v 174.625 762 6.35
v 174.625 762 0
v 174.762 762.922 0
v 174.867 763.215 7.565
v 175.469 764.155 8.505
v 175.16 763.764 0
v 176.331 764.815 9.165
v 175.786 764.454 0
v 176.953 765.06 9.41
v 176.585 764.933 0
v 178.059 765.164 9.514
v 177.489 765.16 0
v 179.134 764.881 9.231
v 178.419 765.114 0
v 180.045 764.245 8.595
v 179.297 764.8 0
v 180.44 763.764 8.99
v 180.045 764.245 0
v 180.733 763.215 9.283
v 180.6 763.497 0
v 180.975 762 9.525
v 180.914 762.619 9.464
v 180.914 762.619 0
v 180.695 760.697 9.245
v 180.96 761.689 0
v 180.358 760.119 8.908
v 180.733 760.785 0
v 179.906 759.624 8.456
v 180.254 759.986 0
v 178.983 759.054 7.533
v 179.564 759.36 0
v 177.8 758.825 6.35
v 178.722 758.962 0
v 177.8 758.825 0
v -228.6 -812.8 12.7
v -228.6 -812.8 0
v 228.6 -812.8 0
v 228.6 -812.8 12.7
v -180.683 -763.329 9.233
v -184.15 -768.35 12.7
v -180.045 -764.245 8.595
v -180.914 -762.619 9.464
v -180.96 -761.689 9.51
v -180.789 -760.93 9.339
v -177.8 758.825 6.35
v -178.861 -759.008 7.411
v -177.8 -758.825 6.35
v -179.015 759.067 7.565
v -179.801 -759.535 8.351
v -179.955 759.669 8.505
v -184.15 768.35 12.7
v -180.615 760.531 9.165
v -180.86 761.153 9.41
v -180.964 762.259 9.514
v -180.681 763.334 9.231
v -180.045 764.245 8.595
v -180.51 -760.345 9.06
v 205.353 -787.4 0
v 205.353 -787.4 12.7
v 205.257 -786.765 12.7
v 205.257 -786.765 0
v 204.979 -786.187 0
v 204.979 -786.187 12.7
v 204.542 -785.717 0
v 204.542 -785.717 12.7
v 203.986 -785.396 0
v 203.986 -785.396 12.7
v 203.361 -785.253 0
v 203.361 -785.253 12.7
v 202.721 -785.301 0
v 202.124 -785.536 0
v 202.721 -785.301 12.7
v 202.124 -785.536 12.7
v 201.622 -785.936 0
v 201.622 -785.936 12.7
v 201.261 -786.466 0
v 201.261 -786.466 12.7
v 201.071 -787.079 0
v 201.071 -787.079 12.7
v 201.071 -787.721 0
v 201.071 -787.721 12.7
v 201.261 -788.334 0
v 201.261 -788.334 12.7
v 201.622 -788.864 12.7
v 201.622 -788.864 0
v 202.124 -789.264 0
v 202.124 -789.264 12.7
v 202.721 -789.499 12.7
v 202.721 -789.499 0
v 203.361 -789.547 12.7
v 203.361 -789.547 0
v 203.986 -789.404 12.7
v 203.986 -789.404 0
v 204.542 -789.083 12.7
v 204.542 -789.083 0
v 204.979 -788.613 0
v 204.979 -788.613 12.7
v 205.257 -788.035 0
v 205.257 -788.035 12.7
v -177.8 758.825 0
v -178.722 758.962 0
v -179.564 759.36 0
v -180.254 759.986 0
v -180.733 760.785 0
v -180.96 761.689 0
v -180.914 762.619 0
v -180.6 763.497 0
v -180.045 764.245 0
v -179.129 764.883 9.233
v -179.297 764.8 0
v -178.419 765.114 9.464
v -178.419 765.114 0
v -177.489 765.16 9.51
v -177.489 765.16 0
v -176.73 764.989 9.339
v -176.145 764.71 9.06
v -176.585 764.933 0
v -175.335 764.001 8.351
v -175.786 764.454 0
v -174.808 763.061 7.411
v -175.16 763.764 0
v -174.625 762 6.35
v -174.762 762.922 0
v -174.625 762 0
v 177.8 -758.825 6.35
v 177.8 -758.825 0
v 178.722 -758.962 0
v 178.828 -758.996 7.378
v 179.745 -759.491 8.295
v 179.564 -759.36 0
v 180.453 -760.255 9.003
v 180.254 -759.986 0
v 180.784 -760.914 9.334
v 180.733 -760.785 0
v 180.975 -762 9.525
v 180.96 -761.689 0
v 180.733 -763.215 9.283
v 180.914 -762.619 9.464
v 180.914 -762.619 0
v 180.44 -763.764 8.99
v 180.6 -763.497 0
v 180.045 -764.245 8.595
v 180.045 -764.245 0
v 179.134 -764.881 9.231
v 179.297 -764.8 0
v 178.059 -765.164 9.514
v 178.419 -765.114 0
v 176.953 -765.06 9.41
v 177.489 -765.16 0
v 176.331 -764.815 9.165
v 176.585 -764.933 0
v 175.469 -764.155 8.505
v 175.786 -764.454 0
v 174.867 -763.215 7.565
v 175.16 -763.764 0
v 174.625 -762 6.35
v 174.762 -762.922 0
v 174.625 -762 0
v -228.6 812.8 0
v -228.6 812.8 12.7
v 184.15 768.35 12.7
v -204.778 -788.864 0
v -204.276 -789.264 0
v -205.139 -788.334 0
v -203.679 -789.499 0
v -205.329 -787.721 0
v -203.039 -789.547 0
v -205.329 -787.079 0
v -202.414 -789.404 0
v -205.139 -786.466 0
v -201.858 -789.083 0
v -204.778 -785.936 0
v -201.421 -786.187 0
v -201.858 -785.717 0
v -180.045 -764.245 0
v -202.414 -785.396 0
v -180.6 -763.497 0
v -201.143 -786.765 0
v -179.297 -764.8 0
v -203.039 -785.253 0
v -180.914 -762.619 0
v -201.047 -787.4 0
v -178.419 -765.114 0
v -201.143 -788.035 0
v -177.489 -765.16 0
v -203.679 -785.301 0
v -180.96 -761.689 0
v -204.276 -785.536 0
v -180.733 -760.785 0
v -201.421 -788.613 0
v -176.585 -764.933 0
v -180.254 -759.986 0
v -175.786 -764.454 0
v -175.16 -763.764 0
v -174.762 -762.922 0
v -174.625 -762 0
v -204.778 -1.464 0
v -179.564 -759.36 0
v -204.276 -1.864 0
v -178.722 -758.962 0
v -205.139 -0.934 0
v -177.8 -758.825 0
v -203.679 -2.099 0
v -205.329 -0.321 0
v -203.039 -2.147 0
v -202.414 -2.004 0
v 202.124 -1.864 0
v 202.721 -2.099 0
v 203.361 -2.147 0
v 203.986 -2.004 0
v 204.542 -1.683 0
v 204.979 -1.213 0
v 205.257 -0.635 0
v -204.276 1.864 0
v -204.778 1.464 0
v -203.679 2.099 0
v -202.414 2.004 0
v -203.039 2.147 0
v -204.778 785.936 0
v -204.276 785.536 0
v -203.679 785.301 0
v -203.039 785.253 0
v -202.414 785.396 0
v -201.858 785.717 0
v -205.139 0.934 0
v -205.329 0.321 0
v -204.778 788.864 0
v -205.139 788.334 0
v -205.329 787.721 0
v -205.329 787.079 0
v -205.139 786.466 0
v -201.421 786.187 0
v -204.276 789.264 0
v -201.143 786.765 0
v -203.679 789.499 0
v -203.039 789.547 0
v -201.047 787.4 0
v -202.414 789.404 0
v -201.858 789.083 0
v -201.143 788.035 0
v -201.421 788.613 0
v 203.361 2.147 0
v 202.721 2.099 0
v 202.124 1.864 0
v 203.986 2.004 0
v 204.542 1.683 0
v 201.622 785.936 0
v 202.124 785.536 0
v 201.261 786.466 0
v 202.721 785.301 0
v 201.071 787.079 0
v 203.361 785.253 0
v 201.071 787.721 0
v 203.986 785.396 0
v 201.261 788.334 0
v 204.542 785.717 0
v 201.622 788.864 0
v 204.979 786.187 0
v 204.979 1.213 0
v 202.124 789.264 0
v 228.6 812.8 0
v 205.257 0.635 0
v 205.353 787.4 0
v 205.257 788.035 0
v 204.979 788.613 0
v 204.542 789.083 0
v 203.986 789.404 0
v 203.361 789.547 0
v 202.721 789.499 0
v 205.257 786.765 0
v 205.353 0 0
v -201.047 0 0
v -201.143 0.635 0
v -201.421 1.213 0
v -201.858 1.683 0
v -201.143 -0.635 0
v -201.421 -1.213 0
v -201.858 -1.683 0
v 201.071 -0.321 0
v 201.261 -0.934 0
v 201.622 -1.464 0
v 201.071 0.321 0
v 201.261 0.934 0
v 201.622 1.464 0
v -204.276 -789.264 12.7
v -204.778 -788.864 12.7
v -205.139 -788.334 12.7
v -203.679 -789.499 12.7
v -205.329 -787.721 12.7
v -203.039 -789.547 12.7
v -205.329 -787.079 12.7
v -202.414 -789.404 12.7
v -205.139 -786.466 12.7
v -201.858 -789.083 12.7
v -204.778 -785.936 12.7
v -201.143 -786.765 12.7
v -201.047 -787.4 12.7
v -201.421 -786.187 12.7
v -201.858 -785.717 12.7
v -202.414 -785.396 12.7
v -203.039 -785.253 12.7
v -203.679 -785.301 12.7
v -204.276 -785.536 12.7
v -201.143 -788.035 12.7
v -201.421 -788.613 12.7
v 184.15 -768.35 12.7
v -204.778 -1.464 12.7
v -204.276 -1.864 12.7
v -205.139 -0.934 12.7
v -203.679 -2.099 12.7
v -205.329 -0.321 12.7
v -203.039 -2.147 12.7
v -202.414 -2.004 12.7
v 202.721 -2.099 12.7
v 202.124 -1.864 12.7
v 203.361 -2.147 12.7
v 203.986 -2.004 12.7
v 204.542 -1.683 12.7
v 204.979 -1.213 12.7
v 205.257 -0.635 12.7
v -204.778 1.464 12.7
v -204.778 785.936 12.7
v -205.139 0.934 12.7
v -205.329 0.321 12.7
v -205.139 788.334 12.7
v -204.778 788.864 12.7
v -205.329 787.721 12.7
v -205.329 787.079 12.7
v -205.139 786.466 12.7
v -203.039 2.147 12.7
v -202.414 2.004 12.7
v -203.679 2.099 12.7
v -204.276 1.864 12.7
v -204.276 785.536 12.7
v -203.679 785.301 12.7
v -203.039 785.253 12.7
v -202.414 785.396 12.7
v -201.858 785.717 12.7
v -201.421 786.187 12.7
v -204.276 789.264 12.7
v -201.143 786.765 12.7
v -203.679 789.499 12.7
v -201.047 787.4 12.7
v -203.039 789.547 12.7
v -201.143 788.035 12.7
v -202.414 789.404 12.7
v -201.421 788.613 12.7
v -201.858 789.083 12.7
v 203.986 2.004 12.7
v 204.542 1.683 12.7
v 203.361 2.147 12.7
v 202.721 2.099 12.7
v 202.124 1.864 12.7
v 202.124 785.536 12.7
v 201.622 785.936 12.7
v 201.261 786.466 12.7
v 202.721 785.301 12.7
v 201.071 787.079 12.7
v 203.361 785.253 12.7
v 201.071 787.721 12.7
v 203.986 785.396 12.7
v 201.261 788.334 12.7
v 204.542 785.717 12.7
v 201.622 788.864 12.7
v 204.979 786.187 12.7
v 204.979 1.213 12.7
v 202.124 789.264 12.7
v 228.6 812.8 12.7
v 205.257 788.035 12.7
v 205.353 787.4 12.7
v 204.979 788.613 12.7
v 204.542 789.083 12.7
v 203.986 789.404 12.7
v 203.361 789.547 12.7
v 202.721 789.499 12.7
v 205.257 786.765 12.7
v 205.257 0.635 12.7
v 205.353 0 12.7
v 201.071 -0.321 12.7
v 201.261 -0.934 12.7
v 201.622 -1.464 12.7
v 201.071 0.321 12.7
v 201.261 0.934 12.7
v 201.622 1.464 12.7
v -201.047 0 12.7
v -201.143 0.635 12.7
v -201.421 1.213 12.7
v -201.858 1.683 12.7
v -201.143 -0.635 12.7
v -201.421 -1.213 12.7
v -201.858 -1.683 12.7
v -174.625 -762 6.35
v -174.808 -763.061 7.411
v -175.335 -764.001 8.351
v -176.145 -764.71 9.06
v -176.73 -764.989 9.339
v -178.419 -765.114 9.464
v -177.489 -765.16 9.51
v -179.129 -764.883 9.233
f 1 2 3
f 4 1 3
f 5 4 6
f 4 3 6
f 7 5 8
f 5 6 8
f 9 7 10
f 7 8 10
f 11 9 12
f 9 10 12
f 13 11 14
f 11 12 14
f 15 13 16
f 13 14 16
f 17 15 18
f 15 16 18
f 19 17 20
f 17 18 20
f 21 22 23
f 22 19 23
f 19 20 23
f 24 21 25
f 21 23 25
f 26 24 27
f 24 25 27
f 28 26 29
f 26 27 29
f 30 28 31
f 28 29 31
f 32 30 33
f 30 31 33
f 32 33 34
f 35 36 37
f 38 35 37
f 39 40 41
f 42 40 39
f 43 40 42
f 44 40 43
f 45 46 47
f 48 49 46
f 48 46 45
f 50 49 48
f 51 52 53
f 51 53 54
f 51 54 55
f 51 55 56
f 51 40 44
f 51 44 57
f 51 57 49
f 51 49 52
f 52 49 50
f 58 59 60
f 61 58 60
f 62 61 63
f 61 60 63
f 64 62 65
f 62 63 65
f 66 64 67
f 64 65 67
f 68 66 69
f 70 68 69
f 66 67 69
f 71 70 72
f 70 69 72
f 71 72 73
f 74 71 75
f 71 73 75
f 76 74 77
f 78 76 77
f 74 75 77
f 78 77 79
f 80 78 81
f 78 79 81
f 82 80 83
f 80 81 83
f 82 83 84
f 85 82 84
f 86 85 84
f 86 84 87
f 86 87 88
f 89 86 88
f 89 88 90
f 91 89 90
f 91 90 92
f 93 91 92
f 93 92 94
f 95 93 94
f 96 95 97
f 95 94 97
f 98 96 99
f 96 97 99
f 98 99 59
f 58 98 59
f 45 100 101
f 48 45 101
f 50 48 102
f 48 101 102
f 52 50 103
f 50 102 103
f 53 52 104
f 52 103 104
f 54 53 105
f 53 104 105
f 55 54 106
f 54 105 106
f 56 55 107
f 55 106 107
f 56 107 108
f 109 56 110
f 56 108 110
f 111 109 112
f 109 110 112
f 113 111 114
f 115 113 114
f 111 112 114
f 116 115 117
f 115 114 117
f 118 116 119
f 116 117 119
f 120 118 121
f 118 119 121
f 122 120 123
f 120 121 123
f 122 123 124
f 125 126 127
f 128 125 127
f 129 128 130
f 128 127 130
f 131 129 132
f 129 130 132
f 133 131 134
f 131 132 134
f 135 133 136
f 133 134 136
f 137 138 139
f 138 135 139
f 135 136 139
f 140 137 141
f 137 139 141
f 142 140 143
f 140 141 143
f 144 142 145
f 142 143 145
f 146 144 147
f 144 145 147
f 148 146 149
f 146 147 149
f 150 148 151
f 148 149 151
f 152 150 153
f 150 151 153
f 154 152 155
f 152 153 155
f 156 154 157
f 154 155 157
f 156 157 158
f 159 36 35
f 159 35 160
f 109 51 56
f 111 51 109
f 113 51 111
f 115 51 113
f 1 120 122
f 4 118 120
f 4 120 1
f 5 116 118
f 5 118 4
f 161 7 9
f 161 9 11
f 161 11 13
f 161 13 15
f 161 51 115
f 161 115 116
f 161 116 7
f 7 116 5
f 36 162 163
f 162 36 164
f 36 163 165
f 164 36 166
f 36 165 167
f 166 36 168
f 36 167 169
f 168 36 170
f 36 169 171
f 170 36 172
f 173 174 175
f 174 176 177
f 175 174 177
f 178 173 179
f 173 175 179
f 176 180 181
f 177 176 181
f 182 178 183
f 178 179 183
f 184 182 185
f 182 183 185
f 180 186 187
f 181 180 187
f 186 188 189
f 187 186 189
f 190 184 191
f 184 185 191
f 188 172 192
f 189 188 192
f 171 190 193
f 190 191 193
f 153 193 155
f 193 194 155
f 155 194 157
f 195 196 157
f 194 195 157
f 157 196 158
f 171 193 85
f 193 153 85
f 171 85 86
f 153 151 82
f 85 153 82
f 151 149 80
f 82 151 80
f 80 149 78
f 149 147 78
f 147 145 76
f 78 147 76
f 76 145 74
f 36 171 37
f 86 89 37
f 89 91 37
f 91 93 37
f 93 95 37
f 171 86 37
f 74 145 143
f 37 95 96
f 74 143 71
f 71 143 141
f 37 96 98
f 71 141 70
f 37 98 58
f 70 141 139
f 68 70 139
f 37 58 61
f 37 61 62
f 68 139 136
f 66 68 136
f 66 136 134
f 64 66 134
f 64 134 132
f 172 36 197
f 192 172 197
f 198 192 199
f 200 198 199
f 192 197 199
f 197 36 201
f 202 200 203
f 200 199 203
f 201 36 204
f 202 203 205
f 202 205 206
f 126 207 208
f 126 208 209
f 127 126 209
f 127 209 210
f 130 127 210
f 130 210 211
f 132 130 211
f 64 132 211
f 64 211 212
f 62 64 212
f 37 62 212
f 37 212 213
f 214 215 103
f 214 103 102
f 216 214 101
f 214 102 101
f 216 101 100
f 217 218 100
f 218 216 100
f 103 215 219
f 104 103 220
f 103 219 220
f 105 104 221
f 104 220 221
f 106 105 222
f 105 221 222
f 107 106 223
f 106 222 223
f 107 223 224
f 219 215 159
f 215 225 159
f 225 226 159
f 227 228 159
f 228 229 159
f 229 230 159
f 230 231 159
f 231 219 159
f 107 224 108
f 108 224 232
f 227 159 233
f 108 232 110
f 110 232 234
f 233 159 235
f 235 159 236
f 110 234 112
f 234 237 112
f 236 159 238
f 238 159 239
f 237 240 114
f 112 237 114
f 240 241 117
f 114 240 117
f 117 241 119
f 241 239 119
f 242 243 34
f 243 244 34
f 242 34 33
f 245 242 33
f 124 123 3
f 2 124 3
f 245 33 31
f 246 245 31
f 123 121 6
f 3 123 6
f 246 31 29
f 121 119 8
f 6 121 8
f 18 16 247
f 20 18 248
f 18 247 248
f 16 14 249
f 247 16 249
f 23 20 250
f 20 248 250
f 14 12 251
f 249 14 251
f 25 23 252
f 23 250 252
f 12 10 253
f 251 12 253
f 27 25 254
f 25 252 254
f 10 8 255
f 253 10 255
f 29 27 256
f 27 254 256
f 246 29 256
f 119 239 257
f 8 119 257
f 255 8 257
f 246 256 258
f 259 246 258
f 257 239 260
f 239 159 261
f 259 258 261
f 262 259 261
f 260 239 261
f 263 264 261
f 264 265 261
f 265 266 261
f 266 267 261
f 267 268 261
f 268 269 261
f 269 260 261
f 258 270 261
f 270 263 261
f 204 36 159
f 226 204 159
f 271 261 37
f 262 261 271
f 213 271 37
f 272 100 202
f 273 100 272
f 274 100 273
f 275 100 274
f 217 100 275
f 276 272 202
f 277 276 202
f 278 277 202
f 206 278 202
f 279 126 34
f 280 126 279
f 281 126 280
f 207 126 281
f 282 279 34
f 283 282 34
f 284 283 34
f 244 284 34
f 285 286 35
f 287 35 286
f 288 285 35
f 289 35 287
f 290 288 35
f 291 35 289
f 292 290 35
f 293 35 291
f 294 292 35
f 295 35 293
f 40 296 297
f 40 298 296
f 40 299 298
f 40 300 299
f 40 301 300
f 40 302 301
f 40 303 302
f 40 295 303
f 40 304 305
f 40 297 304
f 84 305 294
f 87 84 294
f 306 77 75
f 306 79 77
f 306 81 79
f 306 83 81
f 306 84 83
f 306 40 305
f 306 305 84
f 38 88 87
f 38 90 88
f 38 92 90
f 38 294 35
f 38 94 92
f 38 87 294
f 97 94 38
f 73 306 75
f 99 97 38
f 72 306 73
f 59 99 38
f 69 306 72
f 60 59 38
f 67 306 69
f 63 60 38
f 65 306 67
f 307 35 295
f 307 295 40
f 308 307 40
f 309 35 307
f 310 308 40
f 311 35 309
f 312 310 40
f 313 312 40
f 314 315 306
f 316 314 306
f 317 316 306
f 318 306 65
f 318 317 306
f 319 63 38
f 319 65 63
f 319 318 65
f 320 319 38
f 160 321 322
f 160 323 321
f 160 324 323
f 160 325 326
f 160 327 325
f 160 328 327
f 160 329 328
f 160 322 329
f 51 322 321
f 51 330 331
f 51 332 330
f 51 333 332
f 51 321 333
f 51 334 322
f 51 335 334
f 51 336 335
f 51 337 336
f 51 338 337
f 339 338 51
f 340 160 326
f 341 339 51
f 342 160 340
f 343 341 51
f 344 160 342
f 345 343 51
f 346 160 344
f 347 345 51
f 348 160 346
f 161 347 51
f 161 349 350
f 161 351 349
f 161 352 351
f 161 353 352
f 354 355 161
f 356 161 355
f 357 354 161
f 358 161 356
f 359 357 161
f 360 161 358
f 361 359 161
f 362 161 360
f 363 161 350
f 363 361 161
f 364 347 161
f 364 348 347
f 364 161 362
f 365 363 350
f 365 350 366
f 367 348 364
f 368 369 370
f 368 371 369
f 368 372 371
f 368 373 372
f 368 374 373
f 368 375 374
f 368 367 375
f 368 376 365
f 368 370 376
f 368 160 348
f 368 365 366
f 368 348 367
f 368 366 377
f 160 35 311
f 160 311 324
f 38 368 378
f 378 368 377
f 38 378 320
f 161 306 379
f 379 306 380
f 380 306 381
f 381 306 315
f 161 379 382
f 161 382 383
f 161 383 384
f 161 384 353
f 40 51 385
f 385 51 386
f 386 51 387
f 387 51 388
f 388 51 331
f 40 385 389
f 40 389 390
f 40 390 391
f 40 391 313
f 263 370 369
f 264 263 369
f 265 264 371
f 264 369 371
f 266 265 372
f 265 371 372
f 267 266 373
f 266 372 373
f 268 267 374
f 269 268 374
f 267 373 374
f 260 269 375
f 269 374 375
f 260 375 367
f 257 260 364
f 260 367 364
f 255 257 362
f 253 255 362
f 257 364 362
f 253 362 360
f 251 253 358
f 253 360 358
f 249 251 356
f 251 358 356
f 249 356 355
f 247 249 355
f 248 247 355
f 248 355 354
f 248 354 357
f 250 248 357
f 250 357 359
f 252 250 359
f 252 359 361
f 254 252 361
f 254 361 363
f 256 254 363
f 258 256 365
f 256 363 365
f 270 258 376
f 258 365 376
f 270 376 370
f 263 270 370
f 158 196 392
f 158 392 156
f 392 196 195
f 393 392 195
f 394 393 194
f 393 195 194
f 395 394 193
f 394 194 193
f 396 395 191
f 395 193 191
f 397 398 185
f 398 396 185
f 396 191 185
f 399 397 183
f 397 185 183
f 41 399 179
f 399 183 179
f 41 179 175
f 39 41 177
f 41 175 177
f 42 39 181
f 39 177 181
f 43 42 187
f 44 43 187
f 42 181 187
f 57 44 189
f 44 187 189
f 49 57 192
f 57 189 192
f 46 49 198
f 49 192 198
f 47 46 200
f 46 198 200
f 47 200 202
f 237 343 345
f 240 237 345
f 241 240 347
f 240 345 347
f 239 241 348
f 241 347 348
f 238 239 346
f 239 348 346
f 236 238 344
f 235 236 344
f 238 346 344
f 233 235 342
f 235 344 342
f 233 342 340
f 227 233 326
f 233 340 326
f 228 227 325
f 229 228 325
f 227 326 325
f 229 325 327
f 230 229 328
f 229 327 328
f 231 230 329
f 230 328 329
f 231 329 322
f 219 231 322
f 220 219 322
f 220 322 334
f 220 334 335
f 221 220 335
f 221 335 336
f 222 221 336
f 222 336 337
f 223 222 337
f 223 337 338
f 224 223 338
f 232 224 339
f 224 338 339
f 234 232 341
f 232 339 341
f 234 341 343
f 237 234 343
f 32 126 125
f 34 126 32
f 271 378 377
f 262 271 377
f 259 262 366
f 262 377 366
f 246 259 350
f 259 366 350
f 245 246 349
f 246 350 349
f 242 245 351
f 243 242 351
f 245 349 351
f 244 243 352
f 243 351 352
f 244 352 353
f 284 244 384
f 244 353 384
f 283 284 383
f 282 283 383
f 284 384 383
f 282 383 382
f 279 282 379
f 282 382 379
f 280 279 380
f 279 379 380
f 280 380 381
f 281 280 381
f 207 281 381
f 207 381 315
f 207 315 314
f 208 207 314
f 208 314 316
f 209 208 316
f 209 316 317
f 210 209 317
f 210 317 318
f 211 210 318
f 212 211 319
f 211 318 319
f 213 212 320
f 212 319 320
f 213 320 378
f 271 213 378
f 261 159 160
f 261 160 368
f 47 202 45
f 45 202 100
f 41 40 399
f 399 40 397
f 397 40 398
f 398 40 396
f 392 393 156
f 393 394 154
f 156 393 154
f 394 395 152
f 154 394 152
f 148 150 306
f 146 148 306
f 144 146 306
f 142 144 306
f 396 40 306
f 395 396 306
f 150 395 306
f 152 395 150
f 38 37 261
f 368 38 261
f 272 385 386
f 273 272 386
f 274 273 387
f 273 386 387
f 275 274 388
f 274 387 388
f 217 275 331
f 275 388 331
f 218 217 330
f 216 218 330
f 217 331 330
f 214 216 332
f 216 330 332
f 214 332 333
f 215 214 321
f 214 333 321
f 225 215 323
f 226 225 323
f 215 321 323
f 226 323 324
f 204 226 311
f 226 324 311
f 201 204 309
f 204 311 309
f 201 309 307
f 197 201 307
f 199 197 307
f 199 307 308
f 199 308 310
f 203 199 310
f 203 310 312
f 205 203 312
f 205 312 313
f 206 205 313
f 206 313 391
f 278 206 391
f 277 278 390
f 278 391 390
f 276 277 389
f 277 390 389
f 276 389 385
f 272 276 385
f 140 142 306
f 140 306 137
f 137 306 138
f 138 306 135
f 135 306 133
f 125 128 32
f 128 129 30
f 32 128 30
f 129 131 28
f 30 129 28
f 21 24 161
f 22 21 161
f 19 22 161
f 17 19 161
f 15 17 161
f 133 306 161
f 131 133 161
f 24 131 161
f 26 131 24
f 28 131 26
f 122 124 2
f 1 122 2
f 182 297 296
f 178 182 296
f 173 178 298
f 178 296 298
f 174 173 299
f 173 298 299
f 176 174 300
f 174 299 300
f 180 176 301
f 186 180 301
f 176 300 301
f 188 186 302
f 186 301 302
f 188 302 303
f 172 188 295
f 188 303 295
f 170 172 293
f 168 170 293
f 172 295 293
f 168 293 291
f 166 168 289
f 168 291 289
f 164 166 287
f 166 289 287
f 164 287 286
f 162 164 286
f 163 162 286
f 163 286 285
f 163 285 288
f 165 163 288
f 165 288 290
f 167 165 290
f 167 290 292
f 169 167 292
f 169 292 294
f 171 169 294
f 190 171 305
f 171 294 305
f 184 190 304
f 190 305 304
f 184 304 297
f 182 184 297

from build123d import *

# Parameters (mm, degrees)
F0_W     = 457.2
F0_H     = 1625.6
F0_W_2   = 355.6
F0_H_2   = 1524
F1_DEPTH = 12.7
F2_SIZE  = 6.35
F3_R     = 3.175
F4_DEPTH = 12.7
F5_R     = 2.15265
F6_DEPTH = 12.7


with BuildPart() as f1:
    # F0 (on Top) → F1 (new body)
    with BuildSketch(Plane.XY):
        Rectangle(F0_W, F0_H)
        Rectangle(F0_W_2, F0_H_2, mode=Mode.SUBTRACT)
    extrude(amount=F1_DEPTH)

    # F2
    f2_edges = [f1.edges().sort_by_distance(p)[0] for p in [
        (0, 762, 12.7),
        (-177.8, 0, 12.7),
        (177.8, 0, 12.7),
        (0, -762, 12.7),
    ]]
    chamfer(f2_edges, length=F2_SIZE)

    # F3 (on face) → F4 (cut, through all)
    with BuildSketch(Plane(origin=(0, 0, 0), x_dir=(1, 0, 0), z_dir=(0, 0, -1))):
        with Locations((-177.8, -762)):
            Circle(F3_R)
        with Locations((177.8, -762)):
            Circle(F3_R)
        with Locations((177.8, 762)):
            Circle(F3_R)
        with Locations((-177.8, 762)):
            Circle(F3_R)
    extrude(amount=-F4_DEPTH, mode=Mode.SUBTRACT)

    # F5 (on face) → F6 (cut, through all)
    with BuildSketch(Plane.XY.offset(12.7)):
        with Locations((-203.2, -787.4)):
            Circle(F5_R)
        with Locations((203.2, -787.4)):
            Circle(F5_R)
        with Locations((203.2, 0)):
            Circle(F5_R)
        with Locations((-203.2, 0)):
            Circle(F5_R)
        with Locations((-203.2, 787.4)):
            Circle(F5_R)
        with Locations((203.2, 787.4)):
            Circle(F5_R)
    extrude(amount=-F6_DEPTH, mode=Mode.SUBTRACT)


solid = f1.part
